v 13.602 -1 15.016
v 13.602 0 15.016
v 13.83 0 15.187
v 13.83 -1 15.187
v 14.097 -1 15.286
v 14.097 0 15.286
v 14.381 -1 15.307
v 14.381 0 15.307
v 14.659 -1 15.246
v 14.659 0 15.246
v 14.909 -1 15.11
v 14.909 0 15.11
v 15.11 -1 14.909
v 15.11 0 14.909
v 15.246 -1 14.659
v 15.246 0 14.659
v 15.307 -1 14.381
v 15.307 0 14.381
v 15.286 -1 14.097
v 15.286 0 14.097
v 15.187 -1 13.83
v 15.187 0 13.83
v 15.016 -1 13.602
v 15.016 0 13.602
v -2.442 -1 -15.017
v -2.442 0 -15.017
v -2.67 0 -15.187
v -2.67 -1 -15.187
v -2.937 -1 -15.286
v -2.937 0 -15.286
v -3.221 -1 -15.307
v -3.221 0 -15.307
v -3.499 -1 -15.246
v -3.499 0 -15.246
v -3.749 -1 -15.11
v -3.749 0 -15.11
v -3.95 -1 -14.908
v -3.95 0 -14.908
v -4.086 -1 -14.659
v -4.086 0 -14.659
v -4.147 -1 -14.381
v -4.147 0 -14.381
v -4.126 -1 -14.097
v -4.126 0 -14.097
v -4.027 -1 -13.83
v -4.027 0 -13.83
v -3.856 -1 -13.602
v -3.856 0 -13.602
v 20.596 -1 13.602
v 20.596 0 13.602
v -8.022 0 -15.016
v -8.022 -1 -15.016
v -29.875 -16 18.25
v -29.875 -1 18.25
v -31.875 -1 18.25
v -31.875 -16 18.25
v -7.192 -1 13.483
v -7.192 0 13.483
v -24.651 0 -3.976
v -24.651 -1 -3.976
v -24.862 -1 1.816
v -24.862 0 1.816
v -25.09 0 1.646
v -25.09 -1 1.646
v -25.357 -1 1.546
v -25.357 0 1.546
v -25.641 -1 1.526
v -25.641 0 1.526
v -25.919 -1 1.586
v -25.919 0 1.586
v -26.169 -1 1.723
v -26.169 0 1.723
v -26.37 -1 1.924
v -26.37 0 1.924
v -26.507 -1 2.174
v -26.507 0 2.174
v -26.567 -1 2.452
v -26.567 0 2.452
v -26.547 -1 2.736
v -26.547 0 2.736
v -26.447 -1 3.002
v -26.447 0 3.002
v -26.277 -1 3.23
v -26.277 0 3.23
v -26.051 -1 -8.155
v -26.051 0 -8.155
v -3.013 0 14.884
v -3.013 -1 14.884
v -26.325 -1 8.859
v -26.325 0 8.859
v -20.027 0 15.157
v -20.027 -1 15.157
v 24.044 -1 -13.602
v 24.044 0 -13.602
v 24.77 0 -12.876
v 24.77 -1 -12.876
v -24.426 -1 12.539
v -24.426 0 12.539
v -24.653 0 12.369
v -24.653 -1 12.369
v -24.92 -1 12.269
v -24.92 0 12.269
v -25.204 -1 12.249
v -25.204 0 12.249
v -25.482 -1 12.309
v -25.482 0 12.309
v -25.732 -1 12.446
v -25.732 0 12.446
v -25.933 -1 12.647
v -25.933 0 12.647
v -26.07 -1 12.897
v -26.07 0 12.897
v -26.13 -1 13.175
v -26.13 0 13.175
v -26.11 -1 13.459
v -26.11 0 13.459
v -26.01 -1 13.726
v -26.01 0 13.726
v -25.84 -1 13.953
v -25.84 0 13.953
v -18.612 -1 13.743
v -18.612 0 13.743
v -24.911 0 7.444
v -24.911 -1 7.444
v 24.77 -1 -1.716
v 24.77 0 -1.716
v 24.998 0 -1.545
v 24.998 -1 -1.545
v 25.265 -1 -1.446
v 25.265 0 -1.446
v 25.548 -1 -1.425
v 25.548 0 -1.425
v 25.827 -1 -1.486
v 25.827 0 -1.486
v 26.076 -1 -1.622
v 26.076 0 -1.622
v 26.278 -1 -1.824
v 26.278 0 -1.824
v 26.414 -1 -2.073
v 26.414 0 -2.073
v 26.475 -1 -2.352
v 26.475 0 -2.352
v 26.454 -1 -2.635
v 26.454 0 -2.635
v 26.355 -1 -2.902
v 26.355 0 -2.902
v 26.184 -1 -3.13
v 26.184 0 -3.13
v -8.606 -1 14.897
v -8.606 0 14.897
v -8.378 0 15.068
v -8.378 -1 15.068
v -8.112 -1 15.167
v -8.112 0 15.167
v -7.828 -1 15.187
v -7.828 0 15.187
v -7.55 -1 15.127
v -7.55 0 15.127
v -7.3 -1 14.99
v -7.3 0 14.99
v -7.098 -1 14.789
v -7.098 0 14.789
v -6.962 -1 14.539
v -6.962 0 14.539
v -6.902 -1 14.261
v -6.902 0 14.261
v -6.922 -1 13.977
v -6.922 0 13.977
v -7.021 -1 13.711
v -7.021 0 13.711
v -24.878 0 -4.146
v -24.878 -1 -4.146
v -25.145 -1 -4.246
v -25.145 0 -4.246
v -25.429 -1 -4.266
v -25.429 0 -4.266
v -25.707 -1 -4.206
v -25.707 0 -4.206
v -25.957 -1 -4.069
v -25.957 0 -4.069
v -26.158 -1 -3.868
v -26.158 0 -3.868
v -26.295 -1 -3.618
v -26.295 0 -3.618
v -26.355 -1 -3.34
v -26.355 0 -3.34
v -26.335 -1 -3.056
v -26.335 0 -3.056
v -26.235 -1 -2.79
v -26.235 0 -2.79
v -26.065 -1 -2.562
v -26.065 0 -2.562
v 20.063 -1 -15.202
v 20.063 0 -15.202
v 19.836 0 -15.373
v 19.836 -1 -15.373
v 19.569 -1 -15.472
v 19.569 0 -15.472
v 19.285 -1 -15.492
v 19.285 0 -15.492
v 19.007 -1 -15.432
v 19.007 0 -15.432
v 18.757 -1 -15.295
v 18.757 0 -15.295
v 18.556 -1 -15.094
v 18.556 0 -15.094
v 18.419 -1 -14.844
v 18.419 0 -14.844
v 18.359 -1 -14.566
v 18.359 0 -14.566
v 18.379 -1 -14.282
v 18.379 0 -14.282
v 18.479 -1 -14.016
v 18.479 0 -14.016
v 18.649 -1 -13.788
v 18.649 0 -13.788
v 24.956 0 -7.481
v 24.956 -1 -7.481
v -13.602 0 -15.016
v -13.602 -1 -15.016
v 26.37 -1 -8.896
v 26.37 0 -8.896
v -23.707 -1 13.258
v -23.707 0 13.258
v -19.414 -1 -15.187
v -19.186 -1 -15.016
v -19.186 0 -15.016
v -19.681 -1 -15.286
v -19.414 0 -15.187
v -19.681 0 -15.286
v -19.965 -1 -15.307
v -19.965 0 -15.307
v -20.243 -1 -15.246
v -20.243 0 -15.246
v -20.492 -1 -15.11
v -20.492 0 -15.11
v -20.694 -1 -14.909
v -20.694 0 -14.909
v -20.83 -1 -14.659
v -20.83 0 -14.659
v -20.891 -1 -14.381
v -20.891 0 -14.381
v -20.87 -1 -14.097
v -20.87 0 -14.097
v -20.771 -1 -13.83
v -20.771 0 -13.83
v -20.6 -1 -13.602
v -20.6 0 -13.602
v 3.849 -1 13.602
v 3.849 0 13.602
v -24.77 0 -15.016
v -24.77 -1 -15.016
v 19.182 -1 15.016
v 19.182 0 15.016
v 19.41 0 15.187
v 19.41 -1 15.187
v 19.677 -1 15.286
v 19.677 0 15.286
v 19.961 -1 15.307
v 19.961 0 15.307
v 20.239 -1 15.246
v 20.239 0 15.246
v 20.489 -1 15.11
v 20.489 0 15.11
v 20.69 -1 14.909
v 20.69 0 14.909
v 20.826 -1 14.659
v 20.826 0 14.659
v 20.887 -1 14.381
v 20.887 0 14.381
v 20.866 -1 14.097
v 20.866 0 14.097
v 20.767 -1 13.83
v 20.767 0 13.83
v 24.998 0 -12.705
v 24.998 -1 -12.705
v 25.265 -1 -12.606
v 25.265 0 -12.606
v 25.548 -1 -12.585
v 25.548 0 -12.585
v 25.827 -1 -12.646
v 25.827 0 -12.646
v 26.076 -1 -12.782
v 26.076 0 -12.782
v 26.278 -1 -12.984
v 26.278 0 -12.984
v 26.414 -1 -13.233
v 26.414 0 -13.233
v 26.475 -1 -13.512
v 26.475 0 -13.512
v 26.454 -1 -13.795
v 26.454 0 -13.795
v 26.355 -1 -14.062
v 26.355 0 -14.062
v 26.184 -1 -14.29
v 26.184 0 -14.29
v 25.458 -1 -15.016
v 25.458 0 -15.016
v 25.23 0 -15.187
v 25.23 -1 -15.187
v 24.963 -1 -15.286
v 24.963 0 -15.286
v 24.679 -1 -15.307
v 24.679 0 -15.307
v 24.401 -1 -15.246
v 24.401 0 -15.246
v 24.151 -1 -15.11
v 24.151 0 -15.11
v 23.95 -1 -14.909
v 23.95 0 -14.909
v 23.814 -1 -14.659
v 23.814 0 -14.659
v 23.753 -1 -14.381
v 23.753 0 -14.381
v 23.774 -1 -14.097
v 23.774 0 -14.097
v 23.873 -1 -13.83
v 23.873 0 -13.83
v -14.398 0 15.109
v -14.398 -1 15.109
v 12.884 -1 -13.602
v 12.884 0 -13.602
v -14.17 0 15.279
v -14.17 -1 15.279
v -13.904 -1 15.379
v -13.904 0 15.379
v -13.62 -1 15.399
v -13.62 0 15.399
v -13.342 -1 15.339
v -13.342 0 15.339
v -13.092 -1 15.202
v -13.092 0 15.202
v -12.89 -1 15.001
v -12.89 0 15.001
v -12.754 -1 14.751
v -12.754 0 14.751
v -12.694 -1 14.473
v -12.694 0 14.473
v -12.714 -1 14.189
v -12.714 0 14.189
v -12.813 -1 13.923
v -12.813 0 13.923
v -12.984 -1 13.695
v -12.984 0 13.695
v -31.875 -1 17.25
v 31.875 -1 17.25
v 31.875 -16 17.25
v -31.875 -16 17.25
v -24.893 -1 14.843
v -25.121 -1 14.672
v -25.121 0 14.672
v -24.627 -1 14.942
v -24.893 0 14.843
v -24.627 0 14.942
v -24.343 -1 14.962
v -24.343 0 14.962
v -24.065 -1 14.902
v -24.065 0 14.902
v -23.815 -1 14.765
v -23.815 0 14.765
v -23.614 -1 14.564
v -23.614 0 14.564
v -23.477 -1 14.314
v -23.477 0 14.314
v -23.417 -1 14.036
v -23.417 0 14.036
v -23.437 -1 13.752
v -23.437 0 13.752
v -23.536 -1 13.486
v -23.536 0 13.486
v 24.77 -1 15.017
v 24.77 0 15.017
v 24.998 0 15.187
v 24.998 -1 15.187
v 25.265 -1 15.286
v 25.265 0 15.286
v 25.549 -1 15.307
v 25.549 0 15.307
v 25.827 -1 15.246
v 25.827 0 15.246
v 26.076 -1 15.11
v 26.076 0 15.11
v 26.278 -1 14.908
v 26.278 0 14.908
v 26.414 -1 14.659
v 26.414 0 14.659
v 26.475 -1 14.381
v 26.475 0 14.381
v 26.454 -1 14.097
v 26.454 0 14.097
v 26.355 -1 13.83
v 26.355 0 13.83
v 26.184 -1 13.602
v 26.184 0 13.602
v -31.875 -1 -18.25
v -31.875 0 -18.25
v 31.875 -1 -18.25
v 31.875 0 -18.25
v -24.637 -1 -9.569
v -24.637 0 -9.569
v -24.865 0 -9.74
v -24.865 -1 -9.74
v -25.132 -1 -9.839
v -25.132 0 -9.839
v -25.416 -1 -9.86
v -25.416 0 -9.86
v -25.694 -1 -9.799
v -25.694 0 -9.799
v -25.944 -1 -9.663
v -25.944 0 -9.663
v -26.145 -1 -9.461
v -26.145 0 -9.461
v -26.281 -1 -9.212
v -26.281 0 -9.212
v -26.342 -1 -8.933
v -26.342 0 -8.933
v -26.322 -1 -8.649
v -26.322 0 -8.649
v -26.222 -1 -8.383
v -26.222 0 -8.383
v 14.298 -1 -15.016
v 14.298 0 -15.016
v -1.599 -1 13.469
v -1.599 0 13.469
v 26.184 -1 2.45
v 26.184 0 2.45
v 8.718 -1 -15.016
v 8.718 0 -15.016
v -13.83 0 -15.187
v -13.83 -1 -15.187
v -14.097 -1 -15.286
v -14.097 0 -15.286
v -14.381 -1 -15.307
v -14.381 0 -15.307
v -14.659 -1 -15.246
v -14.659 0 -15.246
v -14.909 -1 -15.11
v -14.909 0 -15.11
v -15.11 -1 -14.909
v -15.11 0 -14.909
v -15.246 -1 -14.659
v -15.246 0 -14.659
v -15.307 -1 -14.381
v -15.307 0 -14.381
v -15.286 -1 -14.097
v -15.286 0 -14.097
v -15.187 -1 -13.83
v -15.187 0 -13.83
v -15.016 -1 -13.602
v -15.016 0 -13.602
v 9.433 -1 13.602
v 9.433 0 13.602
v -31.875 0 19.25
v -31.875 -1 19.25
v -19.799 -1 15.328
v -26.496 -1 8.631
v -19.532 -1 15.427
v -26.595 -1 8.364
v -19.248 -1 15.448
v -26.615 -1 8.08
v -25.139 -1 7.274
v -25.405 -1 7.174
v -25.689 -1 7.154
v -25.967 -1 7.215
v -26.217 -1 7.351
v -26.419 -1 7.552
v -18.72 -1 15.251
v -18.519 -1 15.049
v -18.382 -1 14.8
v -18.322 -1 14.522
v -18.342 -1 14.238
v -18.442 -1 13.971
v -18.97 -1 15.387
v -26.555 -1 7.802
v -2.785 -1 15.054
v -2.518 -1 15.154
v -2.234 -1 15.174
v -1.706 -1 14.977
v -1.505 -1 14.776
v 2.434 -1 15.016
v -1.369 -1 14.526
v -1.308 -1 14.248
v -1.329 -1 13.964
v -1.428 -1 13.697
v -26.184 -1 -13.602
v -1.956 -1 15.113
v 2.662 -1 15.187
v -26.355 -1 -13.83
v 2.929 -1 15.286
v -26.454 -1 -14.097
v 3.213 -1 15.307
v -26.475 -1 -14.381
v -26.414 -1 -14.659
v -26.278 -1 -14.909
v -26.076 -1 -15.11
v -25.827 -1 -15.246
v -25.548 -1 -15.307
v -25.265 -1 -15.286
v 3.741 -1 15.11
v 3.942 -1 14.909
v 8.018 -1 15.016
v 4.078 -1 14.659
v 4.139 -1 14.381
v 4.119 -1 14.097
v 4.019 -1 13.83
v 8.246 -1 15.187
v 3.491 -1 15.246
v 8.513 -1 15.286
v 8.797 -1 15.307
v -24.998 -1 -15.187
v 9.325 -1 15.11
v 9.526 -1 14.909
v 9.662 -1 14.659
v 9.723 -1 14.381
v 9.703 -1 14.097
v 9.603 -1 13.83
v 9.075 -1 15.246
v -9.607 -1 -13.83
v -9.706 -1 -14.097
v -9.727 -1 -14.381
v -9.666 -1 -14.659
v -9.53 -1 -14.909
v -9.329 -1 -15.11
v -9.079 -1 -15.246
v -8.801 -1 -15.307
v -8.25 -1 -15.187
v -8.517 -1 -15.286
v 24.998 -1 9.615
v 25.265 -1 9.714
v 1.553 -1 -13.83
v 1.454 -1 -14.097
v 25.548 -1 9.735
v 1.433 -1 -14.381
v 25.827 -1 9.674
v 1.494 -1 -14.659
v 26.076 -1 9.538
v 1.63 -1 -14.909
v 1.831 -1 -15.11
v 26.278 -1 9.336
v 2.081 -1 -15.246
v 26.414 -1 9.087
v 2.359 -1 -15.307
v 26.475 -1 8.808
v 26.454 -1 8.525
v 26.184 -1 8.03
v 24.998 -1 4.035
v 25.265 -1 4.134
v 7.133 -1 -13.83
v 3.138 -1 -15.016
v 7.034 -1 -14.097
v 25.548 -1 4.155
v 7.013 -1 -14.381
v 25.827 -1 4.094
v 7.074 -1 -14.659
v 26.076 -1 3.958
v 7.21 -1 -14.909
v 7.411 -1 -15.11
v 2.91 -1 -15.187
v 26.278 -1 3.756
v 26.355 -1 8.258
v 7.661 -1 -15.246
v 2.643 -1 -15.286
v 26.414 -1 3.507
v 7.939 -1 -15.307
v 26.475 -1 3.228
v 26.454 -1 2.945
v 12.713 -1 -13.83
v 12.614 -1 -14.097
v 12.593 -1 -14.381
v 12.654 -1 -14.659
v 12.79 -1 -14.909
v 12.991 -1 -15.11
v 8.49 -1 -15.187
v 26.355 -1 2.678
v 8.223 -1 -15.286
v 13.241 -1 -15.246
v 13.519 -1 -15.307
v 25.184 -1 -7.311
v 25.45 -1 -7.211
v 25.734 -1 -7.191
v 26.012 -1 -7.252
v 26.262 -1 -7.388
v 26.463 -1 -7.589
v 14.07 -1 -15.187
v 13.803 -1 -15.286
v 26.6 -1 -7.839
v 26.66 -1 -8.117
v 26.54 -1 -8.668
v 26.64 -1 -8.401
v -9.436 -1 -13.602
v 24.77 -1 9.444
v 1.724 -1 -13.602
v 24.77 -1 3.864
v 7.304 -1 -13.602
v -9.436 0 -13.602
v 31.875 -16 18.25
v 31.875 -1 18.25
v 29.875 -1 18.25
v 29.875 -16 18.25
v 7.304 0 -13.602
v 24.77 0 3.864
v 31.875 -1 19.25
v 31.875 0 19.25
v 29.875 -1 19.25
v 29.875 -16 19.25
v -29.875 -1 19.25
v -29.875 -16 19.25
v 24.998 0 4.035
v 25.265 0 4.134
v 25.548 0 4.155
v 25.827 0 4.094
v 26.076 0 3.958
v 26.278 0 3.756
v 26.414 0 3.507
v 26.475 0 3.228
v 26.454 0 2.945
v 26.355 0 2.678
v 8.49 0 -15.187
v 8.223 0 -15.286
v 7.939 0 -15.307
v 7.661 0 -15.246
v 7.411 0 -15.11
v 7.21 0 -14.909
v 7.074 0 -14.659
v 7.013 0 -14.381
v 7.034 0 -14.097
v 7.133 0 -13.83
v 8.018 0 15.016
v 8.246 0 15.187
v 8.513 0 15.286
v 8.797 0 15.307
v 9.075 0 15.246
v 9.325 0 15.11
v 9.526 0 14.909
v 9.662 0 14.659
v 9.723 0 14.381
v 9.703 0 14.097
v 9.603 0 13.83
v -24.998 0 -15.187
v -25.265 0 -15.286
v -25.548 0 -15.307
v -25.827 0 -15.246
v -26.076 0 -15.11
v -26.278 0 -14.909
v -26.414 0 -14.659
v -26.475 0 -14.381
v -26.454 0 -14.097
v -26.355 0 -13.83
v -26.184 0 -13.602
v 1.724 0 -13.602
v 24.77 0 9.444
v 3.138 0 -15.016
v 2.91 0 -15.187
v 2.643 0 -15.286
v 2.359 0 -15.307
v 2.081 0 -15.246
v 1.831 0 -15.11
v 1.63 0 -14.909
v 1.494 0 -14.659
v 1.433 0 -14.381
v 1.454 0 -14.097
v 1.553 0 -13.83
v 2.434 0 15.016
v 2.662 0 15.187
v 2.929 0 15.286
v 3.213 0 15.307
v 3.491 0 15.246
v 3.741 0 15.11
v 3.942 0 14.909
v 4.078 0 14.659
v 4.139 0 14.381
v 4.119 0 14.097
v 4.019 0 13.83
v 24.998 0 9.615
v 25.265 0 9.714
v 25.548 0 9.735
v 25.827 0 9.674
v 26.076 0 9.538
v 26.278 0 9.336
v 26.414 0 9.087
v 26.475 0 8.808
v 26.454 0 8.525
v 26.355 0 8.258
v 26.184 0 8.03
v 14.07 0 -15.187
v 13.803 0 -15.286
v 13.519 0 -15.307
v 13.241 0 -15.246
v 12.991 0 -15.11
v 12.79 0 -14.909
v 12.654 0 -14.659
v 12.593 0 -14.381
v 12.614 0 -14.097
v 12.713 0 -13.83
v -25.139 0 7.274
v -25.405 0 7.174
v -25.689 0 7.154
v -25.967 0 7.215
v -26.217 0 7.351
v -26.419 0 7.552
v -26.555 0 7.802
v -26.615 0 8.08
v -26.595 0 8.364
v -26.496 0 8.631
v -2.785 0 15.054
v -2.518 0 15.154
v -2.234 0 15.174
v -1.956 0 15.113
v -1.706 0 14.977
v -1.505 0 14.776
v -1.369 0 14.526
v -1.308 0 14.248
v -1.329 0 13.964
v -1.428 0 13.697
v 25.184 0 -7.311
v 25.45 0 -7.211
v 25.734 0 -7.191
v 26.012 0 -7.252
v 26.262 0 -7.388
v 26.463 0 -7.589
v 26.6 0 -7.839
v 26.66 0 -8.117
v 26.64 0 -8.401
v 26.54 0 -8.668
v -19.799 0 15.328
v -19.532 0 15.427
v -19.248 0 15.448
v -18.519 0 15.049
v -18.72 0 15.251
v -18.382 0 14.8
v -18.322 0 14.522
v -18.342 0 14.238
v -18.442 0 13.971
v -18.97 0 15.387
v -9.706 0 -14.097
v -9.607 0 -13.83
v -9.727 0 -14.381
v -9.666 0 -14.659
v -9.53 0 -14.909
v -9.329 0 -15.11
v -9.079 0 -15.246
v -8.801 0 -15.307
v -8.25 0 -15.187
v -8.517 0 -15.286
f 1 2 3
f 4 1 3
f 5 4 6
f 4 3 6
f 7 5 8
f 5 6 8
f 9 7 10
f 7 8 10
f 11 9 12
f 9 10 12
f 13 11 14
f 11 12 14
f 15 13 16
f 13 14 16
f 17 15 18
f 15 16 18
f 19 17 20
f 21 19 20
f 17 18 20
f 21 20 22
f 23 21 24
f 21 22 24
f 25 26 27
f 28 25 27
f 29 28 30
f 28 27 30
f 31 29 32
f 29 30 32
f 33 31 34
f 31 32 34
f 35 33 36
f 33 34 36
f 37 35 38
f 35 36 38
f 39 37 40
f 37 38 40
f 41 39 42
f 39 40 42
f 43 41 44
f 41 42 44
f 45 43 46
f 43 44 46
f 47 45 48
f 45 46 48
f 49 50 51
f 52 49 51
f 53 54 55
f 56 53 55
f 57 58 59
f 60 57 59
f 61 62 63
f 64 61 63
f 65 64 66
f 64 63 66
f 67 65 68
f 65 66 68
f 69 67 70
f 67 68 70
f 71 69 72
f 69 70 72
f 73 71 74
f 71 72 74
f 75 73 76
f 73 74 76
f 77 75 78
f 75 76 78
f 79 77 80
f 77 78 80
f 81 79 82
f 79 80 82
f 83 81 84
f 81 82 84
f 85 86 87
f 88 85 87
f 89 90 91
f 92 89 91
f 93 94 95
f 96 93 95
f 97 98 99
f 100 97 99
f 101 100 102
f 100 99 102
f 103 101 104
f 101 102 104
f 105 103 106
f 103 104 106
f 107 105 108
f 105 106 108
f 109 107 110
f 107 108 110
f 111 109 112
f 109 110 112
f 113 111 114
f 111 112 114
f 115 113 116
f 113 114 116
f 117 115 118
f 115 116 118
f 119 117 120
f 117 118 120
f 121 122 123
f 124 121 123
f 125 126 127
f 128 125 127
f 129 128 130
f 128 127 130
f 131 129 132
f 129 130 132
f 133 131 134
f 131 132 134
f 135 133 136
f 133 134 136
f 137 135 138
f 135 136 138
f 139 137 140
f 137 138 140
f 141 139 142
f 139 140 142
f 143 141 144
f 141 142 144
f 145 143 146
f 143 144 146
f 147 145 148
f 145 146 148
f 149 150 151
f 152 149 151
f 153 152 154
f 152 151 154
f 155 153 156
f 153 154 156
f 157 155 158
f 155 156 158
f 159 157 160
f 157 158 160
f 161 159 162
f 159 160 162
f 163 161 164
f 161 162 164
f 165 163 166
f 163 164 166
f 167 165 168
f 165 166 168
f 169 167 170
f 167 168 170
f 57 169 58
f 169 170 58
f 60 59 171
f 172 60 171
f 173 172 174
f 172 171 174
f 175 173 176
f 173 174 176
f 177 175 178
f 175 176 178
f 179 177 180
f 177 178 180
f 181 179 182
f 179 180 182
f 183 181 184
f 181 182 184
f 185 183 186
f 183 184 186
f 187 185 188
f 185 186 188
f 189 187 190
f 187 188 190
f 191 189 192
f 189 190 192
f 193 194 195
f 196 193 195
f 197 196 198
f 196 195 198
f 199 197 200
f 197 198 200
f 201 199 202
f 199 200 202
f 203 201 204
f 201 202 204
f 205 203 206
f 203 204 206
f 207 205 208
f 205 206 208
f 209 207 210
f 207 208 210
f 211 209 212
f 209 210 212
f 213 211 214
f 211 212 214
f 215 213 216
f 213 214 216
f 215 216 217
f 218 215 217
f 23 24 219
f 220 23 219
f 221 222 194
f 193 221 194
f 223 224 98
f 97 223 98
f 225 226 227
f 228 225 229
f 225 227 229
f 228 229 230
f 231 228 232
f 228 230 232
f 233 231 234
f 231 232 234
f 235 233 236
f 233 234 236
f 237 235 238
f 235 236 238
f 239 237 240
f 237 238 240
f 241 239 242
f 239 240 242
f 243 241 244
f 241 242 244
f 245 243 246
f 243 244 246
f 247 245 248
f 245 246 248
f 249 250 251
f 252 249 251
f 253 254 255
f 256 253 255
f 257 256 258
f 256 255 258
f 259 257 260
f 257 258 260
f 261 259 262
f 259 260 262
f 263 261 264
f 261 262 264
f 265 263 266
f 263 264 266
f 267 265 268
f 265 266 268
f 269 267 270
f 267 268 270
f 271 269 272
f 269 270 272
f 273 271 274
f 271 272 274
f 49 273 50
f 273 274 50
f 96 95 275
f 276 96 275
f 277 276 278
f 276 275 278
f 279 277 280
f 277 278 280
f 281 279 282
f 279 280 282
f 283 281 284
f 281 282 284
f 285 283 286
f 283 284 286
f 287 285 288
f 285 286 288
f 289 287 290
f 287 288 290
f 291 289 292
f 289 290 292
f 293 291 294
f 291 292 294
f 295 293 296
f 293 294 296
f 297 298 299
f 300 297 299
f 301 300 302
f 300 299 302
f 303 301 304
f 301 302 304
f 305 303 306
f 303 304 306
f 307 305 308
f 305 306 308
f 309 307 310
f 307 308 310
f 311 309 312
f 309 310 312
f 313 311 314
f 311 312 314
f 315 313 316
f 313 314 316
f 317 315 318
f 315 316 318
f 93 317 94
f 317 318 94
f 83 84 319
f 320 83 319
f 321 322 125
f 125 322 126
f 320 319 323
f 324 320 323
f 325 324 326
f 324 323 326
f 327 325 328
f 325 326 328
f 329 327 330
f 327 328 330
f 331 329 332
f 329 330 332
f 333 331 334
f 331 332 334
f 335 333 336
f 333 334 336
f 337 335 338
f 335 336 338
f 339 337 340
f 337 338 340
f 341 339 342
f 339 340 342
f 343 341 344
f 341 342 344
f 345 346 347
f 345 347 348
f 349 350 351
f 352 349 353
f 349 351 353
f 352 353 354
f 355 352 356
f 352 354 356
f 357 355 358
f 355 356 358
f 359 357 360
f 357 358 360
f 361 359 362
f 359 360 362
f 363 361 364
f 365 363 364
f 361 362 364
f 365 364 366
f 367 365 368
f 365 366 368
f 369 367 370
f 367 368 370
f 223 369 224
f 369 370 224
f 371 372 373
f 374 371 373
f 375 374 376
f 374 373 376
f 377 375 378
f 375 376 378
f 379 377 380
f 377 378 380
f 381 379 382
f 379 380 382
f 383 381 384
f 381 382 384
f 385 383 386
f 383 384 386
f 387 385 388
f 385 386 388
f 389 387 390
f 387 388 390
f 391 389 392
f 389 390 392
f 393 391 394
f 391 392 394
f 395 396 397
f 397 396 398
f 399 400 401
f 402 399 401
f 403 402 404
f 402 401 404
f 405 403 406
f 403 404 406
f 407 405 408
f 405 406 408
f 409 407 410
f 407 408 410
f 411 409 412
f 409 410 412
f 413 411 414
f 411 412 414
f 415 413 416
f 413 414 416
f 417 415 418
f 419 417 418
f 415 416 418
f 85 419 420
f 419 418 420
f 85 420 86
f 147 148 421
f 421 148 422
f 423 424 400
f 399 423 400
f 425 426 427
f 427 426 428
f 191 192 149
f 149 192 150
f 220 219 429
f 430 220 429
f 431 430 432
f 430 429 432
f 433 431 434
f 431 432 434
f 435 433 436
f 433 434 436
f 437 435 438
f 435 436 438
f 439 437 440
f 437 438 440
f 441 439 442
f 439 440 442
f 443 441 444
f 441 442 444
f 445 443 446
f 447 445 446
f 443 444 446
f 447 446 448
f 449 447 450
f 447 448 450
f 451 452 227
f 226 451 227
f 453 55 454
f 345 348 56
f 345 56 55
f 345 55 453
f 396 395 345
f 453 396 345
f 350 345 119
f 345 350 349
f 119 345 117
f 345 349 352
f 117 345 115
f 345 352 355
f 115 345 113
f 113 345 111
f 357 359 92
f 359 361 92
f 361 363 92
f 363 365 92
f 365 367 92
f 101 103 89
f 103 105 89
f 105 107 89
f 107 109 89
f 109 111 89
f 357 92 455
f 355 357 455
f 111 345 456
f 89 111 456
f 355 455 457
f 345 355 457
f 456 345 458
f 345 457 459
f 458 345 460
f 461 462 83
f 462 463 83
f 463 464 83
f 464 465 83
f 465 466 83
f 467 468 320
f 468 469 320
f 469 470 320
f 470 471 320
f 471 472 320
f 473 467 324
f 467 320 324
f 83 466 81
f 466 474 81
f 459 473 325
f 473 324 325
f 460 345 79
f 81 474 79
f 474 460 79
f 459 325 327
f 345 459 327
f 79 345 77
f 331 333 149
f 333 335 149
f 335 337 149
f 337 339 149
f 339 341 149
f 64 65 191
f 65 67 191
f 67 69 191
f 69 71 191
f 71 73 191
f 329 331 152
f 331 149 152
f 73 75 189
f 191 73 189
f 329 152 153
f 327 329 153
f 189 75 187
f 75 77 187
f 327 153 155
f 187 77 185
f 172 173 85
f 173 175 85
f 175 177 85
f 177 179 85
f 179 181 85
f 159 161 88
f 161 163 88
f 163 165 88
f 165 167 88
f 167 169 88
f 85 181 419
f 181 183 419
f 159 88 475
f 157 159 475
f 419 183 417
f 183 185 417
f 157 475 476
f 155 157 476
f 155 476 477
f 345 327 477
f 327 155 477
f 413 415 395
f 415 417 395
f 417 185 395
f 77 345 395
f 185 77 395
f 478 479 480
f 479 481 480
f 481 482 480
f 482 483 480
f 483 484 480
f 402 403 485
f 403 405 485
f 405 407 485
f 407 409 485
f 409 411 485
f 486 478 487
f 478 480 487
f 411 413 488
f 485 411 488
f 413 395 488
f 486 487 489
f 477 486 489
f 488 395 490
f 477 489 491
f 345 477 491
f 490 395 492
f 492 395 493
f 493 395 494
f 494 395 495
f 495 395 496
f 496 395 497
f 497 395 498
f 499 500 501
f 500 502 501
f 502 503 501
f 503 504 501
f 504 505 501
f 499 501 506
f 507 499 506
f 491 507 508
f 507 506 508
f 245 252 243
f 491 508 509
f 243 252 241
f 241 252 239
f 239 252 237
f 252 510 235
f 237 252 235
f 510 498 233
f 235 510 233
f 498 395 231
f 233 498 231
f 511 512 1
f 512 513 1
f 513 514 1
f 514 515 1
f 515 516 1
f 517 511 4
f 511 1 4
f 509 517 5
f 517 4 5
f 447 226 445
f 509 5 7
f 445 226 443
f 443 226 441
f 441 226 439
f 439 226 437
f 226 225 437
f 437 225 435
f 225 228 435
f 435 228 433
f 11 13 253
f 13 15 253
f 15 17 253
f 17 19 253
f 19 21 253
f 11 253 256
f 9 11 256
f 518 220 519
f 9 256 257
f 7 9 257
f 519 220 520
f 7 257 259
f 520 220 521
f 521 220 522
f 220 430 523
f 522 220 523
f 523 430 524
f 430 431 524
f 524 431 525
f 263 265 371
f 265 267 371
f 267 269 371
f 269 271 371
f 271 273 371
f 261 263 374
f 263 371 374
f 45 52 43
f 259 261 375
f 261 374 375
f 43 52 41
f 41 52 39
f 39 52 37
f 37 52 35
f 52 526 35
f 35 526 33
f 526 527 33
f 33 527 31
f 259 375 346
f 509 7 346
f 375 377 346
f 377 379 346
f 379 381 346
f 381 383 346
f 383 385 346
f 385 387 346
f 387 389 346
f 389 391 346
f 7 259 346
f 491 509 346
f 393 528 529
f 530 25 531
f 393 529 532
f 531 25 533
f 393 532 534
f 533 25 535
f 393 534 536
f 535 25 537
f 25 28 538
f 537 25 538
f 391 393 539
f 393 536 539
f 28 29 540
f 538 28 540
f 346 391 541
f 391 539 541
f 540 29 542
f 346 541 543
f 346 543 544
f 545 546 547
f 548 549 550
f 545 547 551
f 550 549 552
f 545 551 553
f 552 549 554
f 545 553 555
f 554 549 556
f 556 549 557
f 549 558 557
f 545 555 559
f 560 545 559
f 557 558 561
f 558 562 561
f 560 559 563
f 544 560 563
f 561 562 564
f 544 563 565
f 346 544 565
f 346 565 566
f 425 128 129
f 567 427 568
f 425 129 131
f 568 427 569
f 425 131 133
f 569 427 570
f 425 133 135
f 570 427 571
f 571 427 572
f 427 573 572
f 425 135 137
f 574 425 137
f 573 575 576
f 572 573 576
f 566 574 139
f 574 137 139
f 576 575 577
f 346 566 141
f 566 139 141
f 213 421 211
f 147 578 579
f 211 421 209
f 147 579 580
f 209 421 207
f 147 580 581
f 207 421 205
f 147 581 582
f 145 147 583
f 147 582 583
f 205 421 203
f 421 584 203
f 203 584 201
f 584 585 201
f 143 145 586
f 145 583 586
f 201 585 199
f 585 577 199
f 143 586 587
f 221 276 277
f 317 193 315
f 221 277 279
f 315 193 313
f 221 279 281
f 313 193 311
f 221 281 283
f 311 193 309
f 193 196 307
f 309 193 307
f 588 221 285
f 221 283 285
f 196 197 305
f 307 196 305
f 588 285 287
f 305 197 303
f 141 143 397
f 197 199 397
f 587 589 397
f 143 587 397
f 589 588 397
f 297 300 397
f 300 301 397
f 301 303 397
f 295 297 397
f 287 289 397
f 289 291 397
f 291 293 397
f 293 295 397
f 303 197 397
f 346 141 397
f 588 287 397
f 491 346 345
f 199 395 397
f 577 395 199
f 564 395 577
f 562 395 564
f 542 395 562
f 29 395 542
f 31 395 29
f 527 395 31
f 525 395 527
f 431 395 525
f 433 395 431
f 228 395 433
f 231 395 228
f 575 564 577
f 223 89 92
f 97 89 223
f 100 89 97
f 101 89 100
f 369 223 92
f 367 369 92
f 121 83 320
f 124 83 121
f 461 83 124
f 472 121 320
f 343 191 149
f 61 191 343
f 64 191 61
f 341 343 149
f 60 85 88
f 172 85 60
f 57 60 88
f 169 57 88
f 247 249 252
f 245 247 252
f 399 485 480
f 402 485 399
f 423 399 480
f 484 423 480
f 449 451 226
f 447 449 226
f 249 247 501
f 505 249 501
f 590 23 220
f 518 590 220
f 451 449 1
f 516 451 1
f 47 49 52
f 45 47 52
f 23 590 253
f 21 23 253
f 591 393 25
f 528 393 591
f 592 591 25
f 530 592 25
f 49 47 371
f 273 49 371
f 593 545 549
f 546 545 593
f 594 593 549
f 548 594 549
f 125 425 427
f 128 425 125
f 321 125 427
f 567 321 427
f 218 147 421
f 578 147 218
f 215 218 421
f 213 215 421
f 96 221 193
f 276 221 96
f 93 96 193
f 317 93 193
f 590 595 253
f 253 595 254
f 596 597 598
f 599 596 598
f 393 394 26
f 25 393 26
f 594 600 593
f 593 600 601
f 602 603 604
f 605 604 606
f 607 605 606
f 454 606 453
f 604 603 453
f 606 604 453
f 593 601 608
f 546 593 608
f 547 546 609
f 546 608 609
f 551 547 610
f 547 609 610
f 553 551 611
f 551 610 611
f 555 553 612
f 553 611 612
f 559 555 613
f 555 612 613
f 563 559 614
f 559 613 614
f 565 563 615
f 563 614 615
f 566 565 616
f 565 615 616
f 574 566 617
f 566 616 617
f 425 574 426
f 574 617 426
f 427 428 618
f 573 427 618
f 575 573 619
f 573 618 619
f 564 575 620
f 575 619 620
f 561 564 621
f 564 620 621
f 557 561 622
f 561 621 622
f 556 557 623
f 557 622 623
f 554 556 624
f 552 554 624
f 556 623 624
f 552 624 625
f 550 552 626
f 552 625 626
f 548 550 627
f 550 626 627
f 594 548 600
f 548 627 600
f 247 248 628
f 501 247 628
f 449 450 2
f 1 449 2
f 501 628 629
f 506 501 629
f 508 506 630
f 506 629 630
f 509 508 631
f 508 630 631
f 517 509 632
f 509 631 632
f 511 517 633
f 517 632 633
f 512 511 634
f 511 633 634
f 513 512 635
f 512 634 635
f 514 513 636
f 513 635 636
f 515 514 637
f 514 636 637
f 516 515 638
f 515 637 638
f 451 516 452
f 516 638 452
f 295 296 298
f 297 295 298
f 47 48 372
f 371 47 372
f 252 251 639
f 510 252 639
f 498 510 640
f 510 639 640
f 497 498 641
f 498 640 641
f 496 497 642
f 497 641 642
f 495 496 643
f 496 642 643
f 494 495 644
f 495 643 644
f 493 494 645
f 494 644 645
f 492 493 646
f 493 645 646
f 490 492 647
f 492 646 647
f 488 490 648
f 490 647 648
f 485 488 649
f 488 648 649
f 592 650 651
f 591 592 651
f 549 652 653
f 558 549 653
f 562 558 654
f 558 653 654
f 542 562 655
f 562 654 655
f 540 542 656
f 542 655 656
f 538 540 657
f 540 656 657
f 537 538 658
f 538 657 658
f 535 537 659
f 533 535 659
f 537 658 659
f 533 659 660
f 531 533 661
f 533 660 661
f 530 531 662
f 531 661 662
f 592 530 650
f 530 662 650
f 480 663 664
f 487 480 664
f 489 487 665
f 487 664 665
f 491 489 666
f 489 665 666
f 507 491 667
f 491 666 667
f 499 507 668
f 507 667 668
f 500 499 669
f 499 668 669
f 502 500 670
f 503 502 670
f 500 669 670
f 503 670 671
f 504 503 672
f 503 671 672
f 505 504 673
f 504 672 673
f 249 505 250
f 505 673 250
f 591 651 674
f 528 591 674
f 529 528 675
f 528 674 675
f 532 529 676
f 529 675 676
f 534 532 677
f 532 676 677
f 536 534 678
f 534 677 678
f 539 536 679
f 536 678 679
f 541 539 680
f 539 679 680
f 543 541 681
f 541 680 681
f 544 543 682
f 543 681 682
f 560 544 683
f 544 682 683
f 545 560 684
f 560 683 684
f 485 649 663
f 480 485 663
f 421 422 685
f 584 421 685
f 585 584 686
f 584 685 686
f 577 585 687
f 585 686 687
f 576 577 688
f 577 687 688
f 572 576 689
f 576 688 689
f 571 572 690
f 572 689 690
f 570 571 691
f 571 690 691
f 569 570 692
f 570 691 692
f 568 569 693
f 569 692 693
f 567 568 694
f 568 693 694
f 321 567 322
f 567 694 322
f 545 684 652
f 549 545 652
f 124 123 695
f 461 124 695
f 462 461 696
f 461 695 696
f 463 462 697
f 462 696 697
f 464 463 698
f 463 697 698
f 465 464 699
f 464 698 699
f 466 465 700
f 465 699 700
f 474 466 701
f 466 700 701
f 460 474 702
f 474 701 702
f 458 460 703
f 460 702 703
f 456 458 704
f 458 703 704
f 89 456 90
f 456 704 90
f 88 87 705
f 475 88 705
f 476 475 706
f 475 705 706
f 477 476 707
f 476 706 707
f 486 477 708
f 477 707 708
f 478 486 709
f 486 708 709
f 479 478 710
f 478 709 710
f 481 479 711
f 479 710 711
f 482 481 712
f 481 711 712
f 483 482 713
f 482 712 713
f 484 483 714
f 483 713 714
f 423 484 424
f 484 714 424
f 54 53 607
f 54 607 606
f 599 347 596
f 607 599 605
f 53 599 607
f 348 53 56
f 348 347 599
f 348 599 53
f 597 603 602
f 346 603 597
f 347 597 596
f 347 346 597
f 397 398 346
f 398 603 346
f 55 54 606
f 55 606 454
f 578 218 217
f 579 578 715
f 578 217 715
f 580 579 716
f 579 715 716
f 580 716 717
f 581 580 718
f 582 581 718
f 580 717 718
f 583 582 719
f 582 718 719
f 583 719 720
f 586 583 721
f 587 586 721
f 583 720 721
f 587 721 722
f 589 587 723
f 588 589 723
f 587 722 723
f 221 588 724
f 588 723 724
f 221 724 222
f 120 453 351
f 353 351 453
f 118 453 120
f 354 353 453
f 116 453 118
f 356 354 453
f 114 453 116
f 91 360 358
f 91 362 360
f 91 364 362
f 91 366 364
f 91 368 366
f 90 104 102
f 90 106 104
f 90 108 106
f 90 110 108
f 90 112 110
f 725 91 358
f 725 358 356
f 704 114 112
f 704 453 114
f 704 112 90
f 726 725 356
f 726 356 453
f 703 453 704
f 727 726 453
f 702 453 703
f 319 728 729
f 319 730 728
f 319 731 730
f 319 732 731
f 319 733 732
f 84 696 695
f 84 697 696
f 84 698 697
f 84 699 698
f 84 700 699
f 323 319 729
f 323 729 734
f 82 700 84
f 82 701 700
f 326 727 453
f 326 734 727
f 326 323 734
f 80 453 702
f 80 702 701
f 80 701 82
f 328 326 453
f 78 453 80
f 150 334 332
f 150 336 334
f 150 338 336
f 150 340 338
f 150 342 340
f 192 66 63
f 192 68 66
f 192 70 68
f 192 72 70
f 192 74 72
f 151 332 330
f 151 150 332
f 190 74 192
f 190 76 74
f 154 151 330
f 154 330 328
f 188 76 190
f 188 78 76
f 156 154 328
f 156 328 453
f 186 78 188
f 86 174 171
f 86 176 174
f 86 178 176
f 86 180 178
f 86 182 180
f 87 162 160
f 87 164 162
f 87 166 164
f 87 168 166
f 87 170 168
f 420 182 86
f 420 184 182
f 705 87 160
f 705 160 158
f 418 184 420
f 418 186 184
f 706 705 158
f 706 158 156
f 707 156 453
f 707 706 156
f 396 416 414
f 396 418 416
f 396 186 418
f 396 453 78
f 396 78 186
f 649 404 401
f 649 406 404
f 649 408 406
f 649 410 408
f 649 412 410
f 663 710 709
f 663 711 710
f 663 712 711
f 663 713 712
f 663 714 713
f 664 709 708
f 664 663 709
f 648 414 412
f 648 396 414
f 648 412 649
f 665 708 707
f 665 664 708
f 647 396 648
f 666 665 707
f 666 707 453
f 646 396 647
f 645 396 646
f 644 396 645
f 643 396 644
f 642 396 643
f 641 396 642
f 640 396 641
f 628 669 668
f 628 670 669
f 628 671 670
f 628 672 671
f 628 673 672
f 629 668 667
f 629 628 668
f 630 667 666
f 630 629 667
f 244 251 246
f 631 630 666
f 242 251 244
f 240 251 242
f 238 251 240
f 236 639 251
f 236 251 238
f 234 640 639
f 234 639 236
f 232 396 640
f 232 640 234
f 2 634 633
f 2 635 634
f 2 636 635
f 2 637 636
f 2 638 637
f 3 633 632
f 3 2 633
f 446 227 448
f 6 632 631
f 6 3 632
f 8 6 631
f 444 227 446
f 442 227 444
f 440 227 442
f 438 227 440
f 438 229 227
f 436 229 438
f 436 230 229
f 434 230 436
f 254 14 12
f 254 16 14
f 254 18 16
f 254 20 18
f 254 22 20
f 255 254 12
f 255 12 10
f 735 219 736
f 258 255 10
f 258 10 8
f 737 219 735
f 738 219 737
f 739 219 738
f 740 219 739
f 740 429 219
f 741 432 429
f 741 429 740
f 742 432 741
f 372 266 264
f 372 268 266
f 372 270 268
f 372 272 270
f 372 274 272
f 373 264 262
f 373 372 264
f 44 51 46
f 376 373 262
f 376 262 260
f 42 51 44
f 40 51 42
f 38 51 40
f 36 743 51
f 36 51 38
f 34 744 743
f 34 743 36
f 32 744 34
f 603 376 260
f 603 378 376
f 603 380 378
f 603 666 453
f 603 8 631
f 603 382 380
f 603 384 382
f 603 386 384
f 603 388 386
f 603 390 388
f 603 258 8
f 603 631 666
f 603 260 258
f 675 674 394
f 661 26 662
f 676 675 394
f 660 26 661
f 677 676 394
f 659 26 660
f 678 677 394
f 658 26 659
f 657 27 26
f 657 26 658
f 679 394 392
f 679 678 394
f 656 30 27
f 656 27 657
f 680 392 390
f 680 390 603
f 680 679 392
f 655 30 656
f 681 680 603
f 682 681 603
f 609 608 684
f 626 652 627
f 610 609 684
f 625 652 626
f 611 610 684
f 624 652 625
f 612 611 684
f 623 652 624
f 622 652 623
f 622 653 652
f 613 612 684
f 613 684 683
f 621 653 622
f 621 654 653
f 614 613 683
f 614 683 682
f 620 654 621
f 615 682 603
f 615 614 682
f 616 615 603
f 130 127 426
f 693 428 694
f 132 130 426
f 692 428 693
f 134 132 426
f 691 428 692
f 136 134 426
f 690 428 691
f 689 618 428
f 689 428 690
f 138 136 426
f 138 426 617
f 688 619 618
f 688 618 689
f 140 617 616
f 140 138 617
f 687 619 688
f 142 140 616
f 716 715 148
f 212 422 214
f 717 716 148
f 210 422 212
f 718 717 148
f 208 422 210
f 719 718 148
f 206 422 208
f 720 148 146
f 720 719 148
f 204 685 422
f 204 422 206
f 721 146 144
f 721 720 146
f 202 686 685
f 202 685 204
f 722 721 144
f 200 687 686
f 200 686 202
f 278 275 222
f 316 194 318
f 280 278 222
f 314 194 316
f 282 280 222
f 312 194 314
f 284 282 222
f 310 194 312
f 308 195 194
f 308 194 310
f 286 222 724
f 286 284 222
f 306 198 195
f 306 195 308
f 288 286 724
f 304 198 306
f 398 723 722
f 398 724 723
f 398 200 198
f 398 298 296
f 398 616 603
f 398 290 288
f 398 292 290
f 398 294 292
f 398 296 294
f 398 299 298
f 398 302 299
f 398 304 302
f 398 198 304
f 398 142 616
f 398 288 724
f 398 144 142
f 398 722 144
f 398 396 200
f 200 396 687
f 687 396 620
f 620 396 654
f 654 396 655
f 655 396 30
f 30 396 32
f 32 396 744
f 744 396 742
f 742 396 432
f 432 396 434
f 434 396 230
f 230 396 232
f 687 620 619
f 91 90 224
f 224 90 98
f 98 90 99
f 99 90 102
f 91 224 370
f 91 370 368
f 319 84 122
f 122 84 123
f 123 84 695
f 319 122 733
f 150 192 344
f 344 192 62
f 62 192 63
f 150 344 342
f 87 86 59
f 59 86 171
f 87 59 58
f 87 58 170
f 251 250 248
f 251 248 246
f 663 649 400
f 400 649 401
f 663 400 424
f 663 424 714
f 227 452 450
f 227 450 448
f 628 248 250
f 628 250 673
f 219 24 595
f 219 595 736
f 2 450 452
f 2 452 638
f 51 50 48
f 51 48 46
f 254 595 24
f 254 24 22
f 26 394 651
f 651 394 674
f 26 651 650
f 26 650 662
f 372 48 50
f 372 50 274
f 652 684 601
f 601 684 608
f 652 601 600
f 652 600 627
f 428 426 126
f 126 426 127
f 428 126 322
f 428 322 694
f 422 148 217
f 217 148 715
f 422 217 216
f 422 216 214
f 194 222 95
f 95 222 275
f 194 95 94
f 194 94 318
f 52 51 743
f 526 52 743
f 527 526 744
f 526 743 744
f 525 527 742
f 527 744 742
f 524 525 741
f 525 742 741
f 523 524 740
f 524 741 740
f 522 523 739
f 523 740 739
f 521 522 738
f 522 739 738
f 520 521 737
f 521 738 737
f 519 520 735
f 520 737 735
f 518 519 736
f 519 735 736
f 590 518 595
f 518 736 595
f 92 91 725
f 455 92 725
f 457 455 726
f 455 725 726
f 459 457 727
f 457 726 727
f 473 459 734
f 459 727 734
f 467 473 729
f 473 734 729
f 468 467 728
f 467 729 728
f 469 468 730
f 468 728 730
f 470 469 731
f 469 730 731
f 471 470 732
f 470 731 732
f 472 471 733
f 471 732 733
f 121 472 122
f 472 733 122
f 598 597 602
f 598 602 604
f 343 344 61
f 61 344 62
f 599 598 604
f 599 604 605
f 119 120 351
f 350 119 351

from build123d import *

# Parameters (mm, degrees)
SKETCH1_W           = 63.75
SKETCH1_H           = 36.5
BOSS_EXTRUDE1_DEPTH = 1
SKETCH2_W           = 63.75
SKETCH2_H           = 1
BOSS_EXTRUDE2_DEPTH = 15
BOSS_EXTRUDE3_DEPTH = 1
CUT_EXTRUDE1_REACH  = 18


with BuildPart() as part:
    # Sketch1 → Boss-Extrude1 (new body)
    with BuildSketch(Plane(origin=(0, 0, 0), x_dir=(1, 0, 0), z_dir=(0, 1, 0))):
        Rectangle(SKETCH1_W, SKETCH1_H)
    extrude(amount=-BOSS_EXTRUDE1_DEPTH)

    # Sketch2 → Boss-Extrude2 (add)
    with BuildSketch(Plane(origin=(0, -1, 0), x_dir=(-1, 0, 0), z_dir=(0, -1, 0))):
        with Locations((0, -17.75)):
            Rectangle(SKETCH2_W, SKETCH2_H)
    extrude(amount=BOSS_EXTRUDE2_DEPTH)

    # Sketch3 → Boss-Extrude3 (add)
    with BuildSketch(Plane.XY.offset(18.25)):
        Polygon((-31.875, 0), (31.875, 0), (31.875, -1), (29.875, -1), (29.875, -16), (-29.875, -16), (-29.875, -1), (-31.875, -1), align=None)
    extrude(amount=BOSS_EXTRUDE3_DEPTH)

    # Sketch4 → Cut-Extrude1 (cut, up to next)
    with BuildSketch(Plane(origin=(0, 0, 0), x_dir=(1, 0, 0), z_dir=(0, 1, 0)), mode=Mode.PRIVATE) as cut_extrude1_sk1:
        with BuildLine():
            Line((-23.706953695, -13.257748955), (-24.425558305, -12.539144346))
            ThreePointArc((-24.425558305, -12.539144346), (-25.839771867, -12.539144346), (-25.839771867, -13.953357908))
            Line((-25.839771867, -13.953357908), (-25.121167258, -14.671962518))
            ThreePointArc((-25.121167258, -14.671962518), (-23.706953695, -14.671962518), (-23.706953695, -13.257748955))
        make_face()
    cut_extrude1_tool1 = extrude(cut_extrude1_sk1.sketch, amount=-CUT_EXTRUDE1_REACH, mode=Mode.PRIVATE) & part.part
    add(cut_extrude1_tool1.solids().sort_by_distance((-24.773363, 0, 13.605553))[0], mode=Mode.SUBTRACT)
    # Sketch4 → Cut-Extrude1 (cut, up to next)
    with BuildSketch(Plane(origin=(0, 0, 0), x_dir=(1, 0, 0), z_dir=(0, 1, 0)), mode=Mode.PRIVATE) as cut_extrude1_sk2:
        with BuildLine():
            Line((-18.612300872, -13.743096131), (-24.910905481, -7.444491522))
            ThreePointArc((-24.910905481, -7.444491522), (-26.325119043, -7.444491522), (-26.325119043, -8.858705084))
            Line((-26.325119043, -8.858705084), (-20.026514434, -15.157309694))
            ThreePointArc((-20.026514434, -15.157309694), (-18.612300872, -15.157309694), (-18.612300872, -13.743096131))
        make_face()
    cut_extrude1_tool2 = extrude(cut_extrude1_sk2.sketch, amount=-CUT_EXTRUDE1_REACH, mode=Mode.PRIVATE) & part.part
    add(cut_extrude1_tool2.solids().sort_by_distance((-22.46871, 0, 11.300901))[0], mode=Mode.SUBTRACT)
    # Sketch4 → Cut-Extrude1 (cut, up to next)
    with BuildSketch(Plane(origin=(0, 0, 0), x_dir=(1, 0, 0), z_dir=(0, 1, 0)), mode=Mode.PRIVATE) as cut_extrude1_sk3:
        with BuildLine():
            Line((-12.983889235, -13.694684495), (-24.862493845, -1.816079885))
            ThreePointArc((-24.862493845, -1.816079885), (-26.276707407, -1.816079885), (-26.276707407, -3.230293448))
            Line((-26.276707407, -3.230293448), (-14.398102798, -15.108898057))
            ThreePointArc((-14.398102798, -15.108898057), (-12.983889235, -15.108898057), (-12.983889235, -13.694684495))
        make_face()
    cut_extrude1_tool3 = extrude(cut_extrude1_sk3.sketch, amount=-CUT_EXTRUDE1_REACH, mode=Mode.PRIVATE) & part.part
    add(cut_extrude1_tool3.solids().sort_by_distance((-19.630298, 0, 8.462489))[0], mode=Mode.SUBTRACT)
    # Sketch4 → Cut-Extrude1 (cut, up to next)
    with BuildSketch(Plane(origin=(0, 0, 0), x_dir=(1, 0, 0), z_dir=(0, 1, 0)), mode=Mode.PRIVATE) as cut_extrude1_sk4:
        with BuildLine():
            Line((-7.19192546, -13.482720719), (-24.650530069, 3.97588389))
            ThreePointArc((-24.650530069, 3.97588389), (-26.064743631, 3.97588389), (-26.064743631, 2.561670328))
            Line((-26.064743631, 2.561670328), (-8.606139022, -14.896934282))
            ThreePointArc((-8.606139022, -14.896934282), (-7.19192546, -14.896934282), (-7.19192546, -13.482720719))
        make_face()
    cut_extrude1_tool4 = extrude(cut_extrude1_sk4.sketch, amount=-CUT_EXTRUDE1_REACH, mode=Mode.PRIVATE) & part.part
    add(cut_extrude1_tool4.solids().sort_by_distance((-16.628335, 0, 5.460525))[0], mode=Mode.SUBTRACT)
    # Sketch4 → Cut-Extrude1 (cut, up to next)
    with BuildSketch(Plane(origin=(0, 0, 0), x_dir=(1, 0, 0), z_dir=(0, 1, 0)), mode=Mode.PRIVATE) as cut_extrude1_sk5:
        with BuildLine():
            Line((-1.598647721, -13.469442981), (-24.63725233, 9.569161629))
            ThreePointArc((-24.63725233, 9.569161629), (-26.051465893, 9.569161629), (-26.051465893, 8.154948066))
            Line((-26.051465893, 8.154948066), (-3.012861283, -14.883656543))
            ThreePointArc((-3.012861283, -14.883656543), (-1.598647721, -14.883656543), (-1.598647721, -13.469442981))
        make_face()
    cut_extrude1_tool5 = extrude(cut_extrude1_sk5.sketch, amount=-CUT_EXTRUDE1_REACH, mode=Mode.PRIVATE) & part.part
    add(cut_extrude1_tool5.solids().sort_by_distance((-13.825057, 0, 2.657247))[0], mode=Mode.SUBTRACT)
    # Sketch4 → Cut-Extrude1 (cut, up to next)
    with BuildSketch(Plane(origin=(0, 0, 0), x_dir=(1, 0, 0), z_dir=(0, 1, 0)), mode=Mode.PRIVATE) as cut_extrude1_sk6:
        with BuildLine():
            Line((3.848599736, -13.602195524), (-24.770004873, 15.016409086))
            ThreePointArc((-24.770004873, 15.016409086), (-26.184218436, 15.016409086), (-26.184218436, 13.602195524))
            Line((-26.184218436, 13.602195524), (2.434386174, -15.016409086))
            ThreePointArc((2.434386174, -15.016409086), (3.848599736, -15.016409086), (3.848599736, -13.602195524))
        make_face()
    cut_extrude1_tool6 = extrude(cut_extrude1_sk6.sketch, amount=-CUT_EXTRUDE1_REACH, mode=Mode.PRIVATE) & part.part
    add(cut_extrude1_tool6.solids().sort_by_distance((-11.167809, 0, 0))[0], mode=Mode.SUBTRACT)
    # Sketch4 → Cut-Extrude1 (cut, up to next)
    with BuildSketch(Plane(origin=(0, 0, 0), x_dir=(1, 0, 0), z_dir=(0, 1, 0)), mode=Mode.PRIVATE) as cut_extrude1_sk7:
        with BuildLine():
            Line((9.432504411, -13.602195524), (-19.186100198, 15.016409086))
            ThreePointArc((-19.186100198, 15.016409086), (-20.600313761, 15.016409086), (-20.600313761, 13.602195524))
            Line((-20.600313761, 13.602195524), (8.018290849, -15.016409086))
            ThreePointArc((8.018290849, -15.016409086), (9.432504411, -15.016409086), (9.432504411, -13.602195524))
        make_face()
    cut_extrude1_tool7 = extrude(cut_extrude1_sk7.sketch, amount=-CUT_EXTRUDE1_REACH, mode=Mode.PRIVATE) & part.part
    add(cut_extrude1_tool7.solids().sort_by_distance((-5.583905, 0, 0))[0], mode=Mode.SUBTRACT)
    # Sketch4 → Cut-Extrude1 (cut, up to next)
    with BuildSketch(Plane(origin=(0, 0, 0), x_dir=(1, 0, 0), z_dir=(0, 1, 0)), mode=Mode.PRIVATE) as cut_extrude1_sk8:
        with BuildLine():
            Line((15.016409086, -13.602195524), (-13.602195524, 15.016409086))
            ThreePointArc((-13.602195524, 15.016409086), (-15.016409086, 15.016409086), (-15.016409086, 13.602195524))
            Line((-15.016409086, 13.602195524), (13.602195524, -15.016409086))
            ThreePointArc((13.602195524, -15.016409086), (15.016409086, -15.016409086), (15.016409086, -13.602195524))
        make_face()
    cut_extrude1_tool8 = extrude(cut_extrude1_sk8.sketch, amount=-CUT_EXTRUDE1_REACH, mode=Mode.PRIVATE) & part.part
    add(cut_extrude1_tool8.solids().sort_by_distance((0, 0, 0))[0], mode=Mode.SUBTRACT)
    # Sketch4 → Cut-Extrude1 (cut, up to next)
    with BuildSketch(Plane(origin=(0, 0, 0), x_dir=(1, 0, 0), z_dir=(0, 1, 0)), mode=Mode.PRIVATE) as cut_extrude1_sk9:
        with BuildLine():
            Line((20.596409086, -13.602195524), (-8.022195524, 15.016409086))
            ThreePointArc((-8.022195524, 15.016409086), (-9.436409086, 15.016409086), (-9.436409086, 13.602195524))
            Line((-9.436409086, 13.602195524), (19.182195524, -15.016409086))
            ThreePointArc((19.182195524, -15.016409086), (20.596409086, -15.016409086), (20.596409086, -13.602195524))
        make_face()
    cut_extrude1_tool9 = extrude(cut_extrude1_sk9.sketch, amount=-CUT_EXTRUDE1_REACH, mode=Mode.PRIVATE) & part.part
    add(cut_extrude1_tool9.solids().sort_by_distance((5.58, 0, 0))[0], mode=Mode.SUBTRACT)
    # Sketch4 → Cut-Extrude1 (cut, up to next)
    with BuildSketch(Plane(origin=(0, 0, 0), x_dir=(1, 0, 0), z_dir=(0, 1, 0)), mode=Mode.PRIVATE) as cut_extrude1_sk10:
        with BuildLine():
            Line((26.184121966, -13.602099067), (-2.442291993, 15.016505543))
            ThreePointArc((-2.442291993, 15.016505543), (-3.856505543, 15.016312616), (-3.856312616, 13.602099067))
            Line((-3.856312616, 13.602099067), (24.770101343, -15.016505543))
            ThreePointArc((24.770101343, -15.016505543), (26.184314892, -15.016312616), (26.184121966, -13.602099067))
        make_face()
    cut_extrude1_tool10 = extrude(cut_extrude1_sk10.sketch, amount=-CUT_EXTRUDE1_REACH, mode=Mode.PRIVATE) & part.part
    add(cut_extrude1_tool10.solids().sort_by_distance((11.163905, 0, 0))[0], mode=Mode.SUBTRACT)
    # Sketch4 → Cut-Extrude1 (cut, up to next)
    with BuildSketch(Plane(origin=(0, 0, 0), x_dir=(1, 0, 0), z_dir=(0, 1, 0)), mode=Mode.PRIVATE) as cut_extrude1_sk11:
        with BuildLine():
            Line((26.184218436, -8.030004873), (3.137804476, 15.016409086))
            ThreePointArc((3.137804476, 15.016409086), (1.723590914, 15.016409086), (1.723590914, 13.602195524))
            Line((1.723590914, 13.602195524), (24.770004873, -9.444218436))
            ThreePointArc((24.770004873, -9.444218436), (26.184218436, -9.444218436), (26.184218436, -8.030004873))
        make_face()
    cut_extrude1_tool11 = extrude(cut_extrude1_sk11.sketch, amount=-CUT_EXTRUDE1_REACH, mode=Mode.PRIVATE) & part.part
    add(cut_extrude1_tool11.solids().sort_by_distance((13.953905, 0, -2.786095))[0], mode=Mode.SUBTRACT)
    # Sketch4 → Cut-Extrude1 (cut, up to next)
    with BuildSketch(Plane(origin=(0, 0, 0), x_dir=(1, 0, 0), z_dir=(0, 1, 0)), mode=Mode.PRIVATE) as cut_extrude1_sk12:
        with BuildLine():
            Line((26.184218436, -2.450004873), (8.717804476, 15.016409086))
            ThreePointArc((8.717804476, 15.016409086), (7.303590914, 15.016409086), (7.303590914, 13.602195524))
            Line((7.303590914, 13.602195524), (24.770004873, -3.864218436))
            ThreePointArc((24.770004873, -3.864218436), (26.184218436, -3.864218436), (26.184218436, -2.450004873))
        make_face()
    cut_extrude1_tool12 = extrude(cut_extrude1_sk12.sketch, amount=-CUT_EXTRUDE1_REACH, mode=Mode.PRIVATE) & part.part
    add(cut_extrude1_tool12.solids().sort_by_distance((16.743905, 0, -5.576095))[0], mode=Mode.SUBTRACT)
    # Sketch4 → Cut-Extrude1 (cut, up to next)
    with BuildSketch(Plane(origin=(0, 0, 0), x_dir=(1, 0, 0), z_dir=(0, 1, 0)), mode=Mode.PRIVATE) as cut_extrude1_sk13:
        with BuildLine():
            Line((26.184218436, 3.129995127), (14.297804476, 15.016409086))
            ThreePointArc((14.297804476, 15.016409086), (12.883590914, 15.016409086), (12.883590914, 13.602195524))
            Line((12.883590914, 13.602195524), (24.770004873, 1.715781564))
            ThreePointArc((24.770004873, 1.715781564), (26.184218436, 1.715781564), (26.184218436, 3.129995127))
        make_face()
    cut_extrude1_tool13 = extrude(cut_extrude1_sk13.sketch, amount=-CUT_EXTRUDE1_REACH, mode=Mode.PRIVATE) & part.part
    add(cut_extrude1_tool13.solids().sort_by_distance((19.533905, 0, -8.366095))[0], mode=Mode.SUBTRACT)
    # Sketch4 → Cut-Extrude1 (cut, up to next)
    with BuildSketch(Plane(origin=(0, 0, 0), x_dir=(1, 0, 0), z_dir=(0, 1, 0)), mode=Mode.PRIVATE) as cut_extrude1_sk14:
        with BuildLine():
            Line((26.369863641, 8.895640332), (20.063449682, 15.202054291))
            ThreePointArc((20.063449682, 15.202054291), (18.64923612, 15.202054291), (18.64923612, 13.787840729))
            Line((18.64923612, 13.787840729), (24.955650079, 7.48142677))
            ThreePointArc((24.955650079, 7.48142677), (26.369863641, 7.48142677), (26.369863641, 8.895640332))
        make_face()
    cut_extrude1_tool14 = extrude(cut_extrude1_sk14.sketch, amount=-CUT_EXTRUDE1_REACH, mode=Mode.PRIVATE) & part.part
    add(cut_extrude1_tool14.solids().sort_by_distance((22.50955, 0, -11.341741))[0], mode=Mode.SUBTRACT)
    # Sketch4 → Cut-Extrude1 (cut, up to next)
    with BuildSketch(Plane(origin=(0, 0, 0), x_dir=(1, 0, 0), z_dir=(0, 1, 0)), mode=Mode.PRIVATE) as cut_extrude1_sk15:
        with BuildLine():
            Line((26.184218436, 14.289995127), (25.457804476, 15.016409086))
            ThreePointArc((25.457804476, 15.016409086), (24.043590914, 15.016409086), (24.043590914, 13.602195524))
            Line((24.043590914, 13.602195524), (24.770004873, 12.875781564))
            ThreePointArc((24.770004873, 12.875781564), (26.184218436, 12.875781564), (26.184218436, 14.289995127))
        make_face()
    cut_extrude1_tool15 = extrude(cut_extrude1_sk15.sketch, amount=-CUT_EXTRUDE1_REACH, mode=Mode.PRIVATE) & part.part
    add(cut_extrude1_tool15.solids().sort_by_distance((25.113905, 0, -13.946095))[0], mode=Mode.SUBTRACT)


solid = part.part
